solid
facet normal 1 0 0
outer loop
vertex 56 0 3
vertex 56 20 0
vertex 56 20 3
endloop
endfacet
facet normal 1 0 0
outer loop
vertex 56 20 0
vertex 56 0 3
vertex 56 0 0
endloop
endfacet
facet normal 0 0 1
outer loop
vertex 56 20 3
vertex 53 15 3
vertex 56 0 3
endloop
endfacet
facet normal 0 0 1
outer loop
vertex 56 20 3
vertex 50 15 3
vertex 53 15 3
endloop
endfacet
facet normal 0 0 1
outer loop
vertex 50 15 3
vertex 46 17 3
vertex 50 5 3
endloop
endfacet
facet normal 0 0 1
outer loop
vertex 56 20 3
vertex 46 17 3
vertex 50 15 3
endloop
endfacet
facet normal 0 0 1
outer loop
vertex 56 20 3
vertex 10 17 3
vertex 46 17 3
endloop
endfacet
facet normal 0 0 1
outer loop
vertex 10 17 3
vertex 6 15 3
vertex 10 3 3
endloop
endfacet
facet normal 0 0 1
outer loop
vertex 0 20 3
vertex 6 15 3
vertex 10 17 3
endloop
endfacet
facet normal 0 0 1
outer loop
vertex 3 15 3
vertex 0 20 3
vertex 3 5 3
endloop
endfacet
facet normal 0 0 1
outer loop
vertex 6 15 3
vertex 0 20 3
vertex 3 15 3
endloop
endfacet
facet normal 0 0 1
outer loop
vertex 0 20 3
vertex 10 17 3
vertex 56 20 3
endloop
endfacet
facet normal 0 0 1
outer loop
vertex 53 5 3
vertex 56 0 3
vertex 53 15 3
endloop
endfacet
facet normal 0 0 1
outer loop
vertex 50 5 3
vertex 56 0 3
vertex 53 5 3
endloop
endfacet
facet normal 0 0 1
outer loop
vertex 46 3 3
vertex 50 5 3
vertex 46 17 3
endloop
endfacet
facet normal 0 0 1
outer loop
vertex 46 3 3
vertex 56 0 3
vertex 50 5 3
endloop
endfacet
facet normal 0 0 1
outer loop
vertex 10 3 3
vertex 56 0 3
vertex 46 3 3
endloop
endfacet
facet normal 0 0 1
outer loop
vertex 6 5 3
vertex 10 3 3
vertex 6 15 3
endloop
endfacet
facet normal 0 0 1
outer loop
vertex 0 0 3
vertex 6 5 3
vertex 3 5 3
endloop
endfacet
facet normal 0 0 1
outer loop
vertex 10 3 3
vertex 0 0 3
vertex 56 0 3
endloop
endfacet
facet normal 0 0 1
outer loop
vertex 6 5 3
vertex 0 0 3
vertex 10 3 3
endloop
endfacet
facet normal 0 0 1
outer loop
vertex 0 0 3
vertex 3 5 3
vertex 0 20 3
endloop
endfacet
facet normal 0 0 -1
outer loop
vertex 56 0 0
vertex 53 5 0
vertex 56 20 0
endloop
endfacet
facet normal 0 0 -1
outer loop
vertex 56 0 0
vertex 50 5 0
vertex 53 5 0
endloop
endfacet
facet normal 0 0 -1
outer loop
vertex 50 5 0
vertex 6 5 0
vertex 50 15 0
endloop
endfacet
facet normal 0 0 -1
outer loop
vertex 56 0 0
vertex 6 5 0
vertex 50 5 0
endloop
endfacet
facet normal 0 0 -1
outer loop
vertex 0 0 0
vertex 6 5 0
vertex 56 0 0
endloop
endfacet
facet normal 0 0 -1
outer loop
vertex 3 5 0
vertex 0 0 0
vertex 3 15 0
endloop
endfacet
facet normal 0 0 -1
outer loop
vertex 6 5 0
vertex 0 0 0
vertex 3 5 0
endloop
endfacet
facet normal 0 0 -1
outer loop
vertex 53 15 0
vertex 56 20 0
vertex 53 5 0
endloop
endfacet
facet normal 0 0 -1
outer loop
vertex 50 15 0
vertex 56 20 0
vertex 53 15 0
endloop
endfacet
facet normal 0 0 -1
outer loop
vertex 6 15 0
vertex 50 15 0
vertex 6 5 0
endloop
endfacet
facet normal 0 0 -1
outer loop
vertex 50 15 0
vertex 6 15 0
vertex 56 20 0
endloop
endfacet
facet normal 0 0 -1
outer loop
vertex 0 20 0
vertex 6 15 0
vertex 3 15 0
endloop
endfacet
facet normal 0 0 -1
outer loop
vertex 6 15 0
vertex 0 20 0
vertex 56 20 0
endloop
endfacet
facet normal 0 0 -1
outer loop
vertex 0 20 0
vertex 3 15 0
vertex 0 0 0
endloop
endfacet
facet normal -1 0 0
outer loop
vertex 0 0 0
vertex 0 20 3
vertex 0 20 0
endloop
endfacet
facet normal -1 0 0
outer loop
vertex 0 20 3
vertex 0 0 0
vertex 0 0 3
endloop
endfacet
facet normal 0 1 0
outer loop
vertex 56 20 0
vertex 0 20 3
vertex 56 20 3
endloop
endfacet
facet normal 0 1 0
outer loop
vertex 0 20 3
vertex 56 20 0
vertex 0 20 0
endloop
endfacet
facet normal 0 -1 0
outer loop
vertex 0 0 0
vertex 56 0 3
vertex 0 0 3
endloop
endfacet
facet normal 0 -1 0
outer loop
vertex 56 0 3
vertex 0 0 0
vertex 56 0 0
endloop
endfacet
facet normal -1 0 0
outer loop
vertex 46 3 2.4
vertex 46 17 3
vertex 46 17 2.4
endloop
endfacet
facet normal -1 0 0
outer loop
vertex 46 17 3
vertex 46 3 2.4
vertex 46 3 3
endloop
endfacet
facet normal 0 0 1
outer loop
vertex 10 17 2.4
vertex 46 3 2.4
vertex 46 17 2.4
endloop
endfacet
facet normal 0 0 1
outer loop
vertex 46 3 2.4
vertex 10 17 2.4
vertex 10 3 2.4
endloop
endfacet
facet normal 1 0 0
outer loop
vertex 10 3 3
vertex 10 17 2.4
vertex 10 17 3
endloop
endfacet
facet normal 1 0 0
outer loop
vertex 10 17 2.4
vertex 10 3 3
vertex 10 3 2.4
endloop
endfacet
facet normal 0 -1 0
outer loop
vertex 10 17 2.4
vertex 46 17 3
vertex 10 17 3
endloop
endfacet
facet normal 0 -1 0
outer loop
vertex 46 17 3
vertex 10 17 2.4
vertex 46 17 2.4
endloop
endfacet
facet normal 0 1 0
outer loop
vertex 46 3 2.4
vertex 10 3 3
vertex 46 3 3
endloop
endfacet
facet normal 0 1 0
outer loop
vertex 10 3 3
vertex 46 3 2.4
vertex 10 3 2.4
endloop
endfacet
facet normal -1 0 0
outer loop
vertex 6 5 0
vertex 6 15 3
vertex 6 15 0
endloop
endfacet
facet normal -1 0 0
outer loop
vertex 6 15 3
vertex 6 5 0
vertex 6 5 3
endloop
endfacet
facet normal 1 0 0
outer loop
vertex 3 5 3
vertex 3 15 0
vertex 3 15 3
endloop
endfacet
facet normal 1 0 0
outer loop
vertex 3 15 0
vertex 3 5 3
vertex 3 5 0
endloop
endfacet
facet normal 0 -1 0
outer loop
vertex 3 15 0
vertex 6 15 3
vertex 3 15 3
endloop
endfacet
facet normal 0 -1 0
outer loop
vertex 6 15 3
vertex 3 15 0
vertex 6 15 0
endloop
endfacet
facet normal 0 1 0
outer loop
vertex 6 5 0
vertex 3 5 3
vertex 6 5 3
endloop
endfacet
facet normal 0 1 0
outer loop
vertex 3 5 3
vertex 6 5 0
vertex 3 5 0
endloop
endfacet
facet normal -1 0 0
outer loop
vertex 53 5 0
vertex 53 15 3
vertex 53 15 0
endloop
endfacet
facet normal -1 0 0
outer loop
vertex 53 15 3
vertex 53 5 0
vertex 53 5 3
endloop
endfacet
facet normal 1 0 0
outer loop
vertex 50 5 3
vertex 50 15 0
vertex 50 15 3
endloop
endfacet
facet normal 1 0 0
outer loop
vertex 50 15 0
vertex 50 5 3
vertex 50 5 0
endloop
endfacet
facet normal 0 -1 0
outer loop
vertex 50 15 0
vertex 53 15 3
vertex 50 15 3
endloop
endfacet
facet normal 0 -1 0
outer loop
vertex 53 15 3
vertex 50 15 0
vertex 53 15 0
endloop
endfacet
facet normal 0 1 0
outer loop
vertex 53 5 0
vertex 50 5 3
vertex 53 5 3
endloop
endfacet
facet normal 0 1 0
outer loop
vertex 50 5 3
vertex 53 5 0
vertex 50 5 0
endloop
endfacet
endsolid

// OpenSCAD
// Original MechIntel educational model. CC0-1.0. Units: mm.
// Not a standardized or load-rated component.
$fn=96;
length=56;
width=20;
thickness=3;
label_length=36;
label_width=14;
recess=0.6;
$fn=64;
difference(){union(){
translate([0,0,0]) cube([length,width,thickness]);
}
translate([(length-label_length)/2,(width-label_width)/2,thickness-recess]) cube([label_length,label_width,recess+1]);
translate([3,5,-1]) cube([3,10,thickness+2]);
translate([length-6,5,-1]) cube([3,10,thickness+2]);
}
